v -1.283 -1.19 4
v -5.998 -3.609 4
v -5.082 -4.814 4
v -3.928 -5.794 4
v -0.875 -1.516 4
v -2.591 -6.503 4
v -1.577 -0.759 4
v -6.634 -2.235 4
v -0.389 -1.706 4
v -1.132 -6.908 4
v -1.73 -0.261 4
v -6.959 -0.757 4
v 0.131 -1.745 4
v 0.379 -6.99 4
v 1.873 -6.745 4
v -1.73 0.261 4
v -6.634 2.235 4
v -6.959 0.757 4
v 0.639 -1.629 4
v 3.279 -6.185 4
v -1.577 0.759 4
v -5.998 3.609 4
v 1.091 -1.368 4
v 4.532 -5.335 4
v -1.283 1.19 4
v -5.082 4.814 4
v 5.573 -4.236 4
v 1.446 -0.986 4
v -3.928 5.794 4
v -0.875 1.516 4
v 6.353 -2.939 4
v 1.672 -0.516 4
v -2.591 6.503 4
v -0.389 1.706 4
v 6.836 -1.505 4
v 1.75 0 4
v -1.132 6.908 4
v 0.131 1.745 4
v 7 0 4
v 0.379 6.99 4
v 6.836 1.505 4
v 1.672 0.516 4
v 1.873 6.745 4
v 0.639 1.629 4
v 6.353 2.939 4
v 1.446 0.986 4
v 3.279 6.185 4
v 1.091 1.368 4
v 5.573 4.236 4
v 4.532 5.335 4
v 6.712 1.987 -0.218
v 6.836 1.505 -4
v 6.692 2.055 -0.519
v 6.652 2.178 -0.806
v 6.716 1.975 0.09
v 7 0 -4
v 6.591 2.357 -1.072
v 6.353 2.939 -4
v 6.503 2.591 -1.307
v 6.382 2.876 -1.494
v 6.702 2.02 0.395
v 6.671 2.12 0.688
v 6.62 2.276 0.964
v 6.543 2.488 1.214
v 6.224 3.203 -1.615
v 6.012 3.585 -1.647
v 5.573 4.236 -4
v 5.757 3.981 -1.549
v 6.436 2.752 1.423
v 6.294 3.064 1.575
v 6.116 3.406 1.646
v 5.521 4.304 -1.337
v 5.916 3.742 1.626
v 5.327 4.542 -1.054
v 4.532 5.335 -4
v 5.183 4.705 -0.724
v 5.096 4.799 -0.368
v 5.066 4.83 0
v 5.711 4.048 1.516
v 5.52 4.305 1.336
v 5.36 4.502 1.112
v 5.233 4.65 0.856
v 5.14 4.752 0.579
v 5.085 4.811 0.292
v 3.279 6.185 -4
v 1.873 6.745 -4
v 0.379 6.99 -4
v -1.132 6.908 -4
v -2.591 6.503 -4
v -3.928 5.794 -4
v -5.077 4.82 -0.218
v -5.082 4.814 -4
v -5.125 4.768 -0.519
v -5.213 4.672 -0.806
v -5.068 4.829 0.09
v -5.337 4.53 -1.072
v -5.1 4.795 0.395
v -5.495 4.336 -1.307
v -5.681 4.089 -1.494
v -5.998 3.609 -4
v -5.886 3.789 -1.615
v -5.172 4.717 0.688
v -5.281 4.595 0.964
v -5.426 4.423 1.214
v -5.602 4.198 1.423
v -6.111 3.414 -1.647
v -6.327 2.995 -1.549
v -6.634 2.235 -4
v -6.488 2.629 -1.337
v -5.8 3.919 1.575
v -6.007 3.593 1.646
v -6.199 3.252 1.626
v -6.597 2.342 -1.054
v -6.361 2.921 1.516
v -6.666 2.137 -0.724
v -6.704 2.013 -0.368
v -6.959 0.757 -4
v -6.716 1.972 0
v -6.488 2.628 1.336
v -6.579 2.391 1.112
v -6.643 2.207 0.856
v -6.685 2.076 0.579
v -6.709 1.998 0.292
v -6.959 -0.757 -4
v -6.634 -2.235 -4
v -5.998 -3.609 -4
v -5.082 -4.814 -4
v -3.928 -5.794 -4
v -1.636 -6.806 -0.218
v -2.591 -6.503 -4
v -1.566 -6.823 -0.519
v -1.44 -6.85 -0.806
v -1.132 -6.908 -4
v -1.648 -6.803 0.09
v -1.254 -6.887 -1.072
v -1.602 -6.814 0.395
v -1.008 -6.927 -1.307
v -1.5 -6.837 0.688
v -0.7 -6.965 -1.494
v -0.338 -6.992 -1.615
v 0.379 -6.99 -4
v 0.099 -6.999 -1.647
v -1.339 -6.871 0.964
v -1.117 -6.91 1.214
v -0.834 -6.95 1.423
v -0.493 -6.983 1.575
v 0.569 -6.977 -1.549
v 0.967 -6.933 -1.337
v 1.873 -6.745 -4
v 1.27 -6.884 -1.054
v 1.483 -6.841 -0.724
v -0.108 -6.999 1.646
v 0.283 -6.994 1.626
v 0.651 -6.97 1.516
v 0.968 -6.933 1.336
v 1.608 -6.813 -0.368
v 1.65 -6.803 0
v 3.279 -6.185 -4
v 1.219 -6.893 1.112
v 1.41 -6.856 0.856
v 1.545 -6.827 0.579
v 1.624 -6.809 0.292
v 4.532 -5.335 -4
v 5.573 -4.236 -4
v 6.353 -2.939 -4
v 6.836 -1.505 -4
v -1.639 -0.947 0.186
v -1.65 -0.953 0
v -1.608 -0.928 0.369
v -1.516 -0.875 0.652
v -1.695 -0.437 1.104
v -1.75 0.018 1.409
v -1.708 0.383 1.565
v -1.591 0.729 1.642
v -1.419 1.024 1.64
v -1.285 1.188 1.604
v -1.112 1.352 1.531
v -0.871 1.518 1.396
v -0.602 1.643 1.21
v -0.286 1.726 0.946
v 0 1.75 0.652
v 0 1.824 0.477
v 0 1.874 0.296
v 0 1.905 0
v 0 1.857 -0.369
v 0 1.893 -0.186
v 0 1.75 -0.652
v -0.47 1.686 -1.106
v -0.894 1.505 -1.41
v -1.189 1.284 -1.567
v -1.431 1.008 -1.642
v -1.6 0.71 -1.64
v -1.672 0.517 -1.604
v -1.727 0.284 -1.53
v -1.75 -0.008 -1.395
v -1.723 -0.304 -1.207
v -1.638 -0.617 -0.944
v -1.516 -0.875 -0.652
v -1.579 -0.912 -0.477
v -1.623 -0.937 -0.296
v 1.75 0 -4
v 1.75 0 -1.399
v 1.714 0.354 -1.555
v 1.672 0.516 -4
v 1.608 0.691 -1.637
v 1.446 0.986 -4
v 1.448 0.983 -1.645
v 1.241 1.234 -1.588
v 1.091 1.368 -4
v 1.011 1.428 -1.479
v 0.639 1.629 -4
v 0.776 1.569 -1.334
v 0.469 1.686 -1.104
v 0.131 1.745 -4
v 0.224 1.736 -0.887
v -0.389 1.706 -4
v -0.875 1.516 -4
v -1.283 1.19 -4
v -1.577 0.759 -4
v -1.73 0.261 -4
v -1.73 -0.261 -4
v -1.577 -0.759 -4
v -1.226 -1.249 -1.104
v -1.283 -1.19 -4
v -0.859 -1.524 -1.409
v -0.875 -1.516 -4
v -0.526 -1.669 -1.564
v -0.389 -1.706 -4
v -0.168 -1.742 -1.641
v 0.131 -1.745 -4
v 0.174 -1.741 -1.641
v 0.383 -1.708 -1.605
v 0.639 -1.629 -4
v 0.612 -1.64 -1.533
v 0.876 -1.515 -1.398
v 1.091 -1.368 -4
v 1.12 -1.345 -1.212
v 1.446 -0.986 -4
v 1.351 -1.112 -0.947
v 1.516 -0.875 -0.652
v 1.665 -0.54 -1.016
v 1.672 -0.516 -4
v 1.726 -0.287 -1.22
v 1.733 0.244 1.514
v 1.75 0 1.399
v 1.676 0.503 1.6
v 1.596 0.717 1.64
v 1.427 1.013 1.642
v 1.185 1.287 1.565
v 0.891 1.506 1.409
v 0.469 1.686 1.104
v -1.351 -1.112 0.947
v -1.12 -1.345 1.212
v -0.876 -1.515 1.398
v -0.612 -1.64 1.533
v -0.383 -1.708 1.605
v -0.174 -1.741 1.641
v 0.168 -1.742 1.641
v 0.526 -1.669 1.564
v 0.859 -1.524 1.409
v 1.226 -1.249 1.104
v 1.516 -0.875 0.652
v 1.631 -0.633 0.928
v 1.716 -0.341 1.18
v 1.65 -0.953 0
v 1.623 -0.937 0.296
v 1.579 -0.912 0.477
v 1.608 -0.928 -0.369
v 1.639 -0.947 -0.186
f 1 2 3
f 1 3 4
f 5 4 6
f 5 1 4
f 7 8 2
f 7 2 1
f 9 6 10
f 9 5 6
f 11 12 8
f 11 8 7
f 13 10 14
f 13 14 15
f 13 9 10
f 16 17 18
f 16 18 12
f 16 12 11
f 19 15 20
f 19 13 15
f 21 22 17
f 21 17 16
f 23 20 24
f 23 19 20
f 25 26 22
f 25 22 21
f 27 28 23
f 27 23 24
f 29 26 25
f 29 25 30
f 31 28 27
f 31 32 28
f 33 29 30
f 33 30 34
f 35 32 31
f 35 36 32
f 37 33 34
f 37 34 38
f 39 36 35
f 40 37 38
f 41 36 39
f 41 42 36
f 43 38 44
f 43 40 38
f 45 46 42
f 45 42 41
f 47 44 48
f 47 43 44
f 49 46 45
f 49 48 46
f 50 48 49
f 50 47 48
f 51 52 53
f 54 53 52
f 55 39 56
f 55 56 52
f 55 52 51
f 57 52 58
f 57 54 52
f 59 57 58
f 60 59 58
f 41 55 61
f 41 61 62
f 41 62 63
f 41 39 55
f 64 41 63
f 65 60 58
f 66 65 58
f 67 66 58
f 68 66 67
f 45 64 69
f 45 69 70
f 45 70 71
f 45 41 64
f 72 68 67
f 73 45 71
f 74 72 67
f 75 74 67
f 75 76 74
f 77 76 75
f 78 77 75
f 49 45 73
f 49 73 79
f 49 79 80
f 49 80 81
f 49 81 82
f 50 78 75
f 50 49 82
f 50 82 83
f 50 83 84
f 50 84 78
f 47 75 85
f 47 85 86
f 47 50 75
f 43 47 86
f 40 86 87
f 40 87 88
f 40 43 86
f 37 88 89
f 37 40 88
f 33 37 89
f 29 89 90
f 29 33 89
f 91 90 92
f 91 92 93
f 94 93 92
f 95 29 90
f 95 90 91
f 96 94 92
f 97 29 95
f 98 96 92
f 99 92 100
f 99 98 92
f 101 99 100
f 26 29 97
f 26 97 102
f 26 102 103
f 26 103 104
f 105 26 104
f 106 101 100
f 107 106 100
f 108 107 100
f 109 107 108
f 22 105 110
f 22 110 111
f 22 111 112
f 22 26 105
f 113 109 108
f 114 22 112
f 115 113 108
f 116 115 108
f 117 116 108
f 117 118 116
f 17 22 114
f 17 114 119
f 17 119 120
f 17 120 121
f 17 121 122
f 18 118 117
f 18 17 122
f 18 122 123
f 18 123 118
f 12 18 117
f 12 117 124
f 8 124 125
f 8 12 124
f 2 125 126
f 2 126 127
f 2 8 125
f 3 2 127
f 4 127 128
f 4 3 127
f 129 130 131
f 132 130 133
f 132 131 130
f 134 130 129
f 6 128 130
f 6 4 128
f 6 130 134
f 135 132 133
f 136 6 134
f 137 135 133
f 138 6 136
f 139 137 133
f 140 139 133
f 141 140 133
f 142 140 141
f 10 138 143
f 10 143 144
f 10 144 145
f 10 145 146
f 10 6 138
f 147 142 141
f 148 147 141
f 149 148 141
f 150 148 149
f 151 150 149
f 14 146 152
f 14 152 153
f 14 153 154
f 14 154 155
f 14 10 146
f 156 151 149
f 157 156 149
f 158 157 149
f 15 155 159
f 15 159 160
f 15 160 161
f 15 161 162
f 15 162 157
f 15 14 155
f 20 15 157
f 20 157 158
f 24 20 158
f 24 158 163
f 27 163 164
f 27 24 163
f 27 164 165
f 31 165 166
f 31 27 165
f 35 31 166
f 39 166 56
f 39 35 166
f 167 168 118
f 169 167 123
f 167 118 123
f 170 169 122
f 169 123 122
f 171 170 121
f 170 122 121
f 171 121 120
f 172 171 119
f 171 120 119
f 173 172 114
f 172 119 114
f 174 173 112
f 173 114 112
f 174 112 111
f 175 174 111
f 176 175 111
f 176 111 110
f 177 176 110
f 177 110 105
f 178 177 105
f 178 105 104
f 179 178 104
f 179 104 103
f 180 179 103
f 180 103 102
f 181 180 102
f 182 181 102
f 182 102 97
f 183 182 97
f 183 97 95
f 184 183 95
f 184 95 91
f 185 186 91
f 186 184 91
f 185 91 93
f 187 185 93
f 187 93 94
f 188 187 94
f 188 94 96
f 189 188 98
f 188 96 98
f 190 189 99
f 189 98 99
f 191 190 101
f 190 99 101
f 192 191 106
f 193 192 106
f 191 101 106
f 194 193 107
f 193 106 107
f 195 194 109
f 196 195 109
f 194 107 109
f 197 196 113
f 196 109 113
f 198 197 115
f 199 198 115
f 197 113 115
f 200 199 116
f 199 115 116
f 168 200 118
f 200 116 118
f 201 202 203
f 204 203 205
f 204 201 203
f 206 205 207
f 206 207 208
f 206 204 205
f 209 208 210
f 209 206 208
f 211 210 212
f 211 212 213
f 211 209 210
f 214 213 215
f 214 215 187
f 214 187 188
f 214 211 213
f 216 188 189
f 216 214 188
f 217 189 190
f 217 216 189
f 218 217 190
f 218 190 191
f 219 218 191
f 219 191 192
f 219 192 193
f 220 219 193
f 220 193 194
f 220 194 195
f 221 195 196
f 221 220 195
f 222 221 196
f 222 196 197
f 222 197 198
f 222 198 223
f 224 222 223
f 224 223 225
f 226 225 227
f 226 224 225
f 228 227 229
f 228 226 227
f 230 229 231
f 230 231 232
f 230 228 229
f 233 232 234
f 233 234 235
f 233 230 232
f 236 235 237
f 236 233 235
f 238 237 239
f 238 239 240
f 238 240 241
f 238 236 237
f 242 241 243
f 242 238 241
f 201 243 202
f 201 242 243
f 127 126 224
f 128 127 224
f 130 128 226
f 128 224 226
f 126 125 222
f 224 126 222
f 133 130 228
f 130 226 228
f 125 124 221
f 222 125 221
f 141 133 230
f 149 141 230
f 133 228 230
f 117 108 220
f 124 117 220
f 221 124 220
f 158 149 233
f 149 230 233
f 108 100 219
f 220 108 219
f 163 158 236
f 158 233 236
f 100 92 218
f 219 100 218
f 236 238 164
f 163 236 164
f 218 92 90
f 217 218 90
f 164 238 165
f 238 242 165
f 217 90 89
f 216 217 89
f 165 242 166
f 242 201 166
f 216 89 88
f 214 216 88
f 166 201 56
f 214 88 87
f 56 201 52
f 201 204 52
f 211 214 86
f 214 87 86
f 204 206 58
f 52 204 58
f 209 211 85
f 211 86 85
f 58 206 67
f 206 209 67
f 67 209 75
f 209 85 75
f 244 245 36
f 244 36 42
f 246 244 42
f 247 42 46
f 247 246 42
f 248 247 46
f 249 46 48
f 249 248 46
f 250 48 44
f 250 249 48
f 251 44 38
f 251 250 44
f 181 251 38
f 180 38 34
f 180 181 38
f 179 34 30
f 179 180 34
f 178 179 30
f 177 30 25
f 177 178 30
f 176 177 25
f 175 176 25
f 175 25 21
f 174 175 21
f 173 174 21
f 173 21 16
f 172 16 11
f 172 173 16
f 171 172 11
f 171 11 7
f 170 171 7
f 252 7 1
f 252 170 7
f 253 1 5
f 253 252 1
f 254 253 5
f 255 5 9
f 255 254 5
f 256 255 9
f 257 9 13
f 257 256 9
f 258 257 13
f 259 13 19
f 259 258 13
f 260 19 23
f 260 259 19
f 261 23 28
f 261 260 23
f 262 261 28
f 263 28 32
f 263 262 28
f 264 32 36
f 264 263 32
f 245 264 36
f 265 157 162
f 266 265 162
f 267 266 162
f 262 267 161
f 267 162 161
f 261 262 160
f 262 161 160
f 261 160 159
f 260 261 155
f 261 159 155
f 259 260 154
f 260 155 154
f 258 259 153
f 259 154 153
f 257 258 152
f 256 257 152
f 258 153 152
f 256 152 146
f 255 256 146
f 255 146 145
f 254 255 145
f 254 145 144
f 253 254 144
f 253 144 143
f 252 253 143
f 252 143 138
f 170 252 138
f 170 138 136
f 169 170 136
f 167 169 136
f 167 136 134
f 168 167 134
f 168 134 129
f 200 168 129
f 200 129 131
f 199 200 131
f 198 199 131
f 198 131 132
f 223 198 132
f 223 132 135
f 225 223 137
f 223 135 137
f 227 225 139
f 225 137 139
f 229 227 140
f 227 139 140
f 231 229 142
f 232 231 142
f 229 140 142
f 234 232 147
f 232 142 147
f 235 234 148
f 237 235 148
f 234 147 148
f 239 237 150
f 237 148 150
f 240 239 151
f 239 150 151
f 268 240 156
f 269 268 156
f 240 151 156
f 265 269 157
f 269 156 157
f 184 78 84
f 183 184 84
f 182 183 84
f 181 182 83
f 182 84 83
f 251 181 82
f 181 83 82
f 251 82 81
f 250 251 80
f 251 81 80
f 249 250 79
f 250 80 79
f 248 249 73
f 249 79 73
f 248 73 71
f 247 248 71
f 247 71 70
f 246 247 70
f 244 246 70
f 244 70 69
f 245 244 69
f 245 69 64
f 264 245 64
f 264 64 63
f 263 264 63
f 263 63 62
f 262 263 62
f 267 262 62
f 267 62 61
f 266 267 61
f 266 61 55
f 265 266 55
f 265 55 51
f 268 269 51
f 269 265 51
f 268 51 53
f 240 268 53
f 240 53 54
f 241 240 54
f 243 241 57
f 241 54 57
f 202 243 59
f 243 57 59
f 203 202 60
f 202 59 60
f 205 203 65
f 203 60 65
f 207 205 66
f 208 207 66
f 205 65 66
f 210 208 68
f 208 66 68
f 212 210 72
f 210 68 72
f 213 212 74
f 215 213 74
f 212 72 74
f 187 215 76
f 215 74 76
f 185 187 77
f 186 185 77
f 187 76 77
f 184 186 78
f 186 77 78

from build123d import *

# Parameters (mm, degrees)
F0_R     = 7
F0_R_2   = 1.75
F1_DEPTH = 4
F2_R     = 1.65
F3_DEPTH = 7
F4_COUNT = 3
F5_DEPTH = 7
F6_DEPTH = 7
F7_DEPTH = 7


with BuildPart() as f1:
    # F0 (on Top) → F1 (new body, symmetric)
    with BuildSketch(Plane.XY):
        Circle(F0_R)
        Circle(F0_R_2, mode=Mode.SUBTRACT)
    extrude(amount=F1_DEPTH, both=True)


with BuildPart() as f3:
    # F2 (on Front) → F3 (new body)
    with BuildSketch(Plane.XZ):
        Circle(F2_R)
    extrude(amount=F3_DEPTH)


with BuildPart() as f4_1:
    # F4: instance of F3
    add(f3.part.rotate(Axis((0, 0, 4), (0, 0, 1)), 1 * 360 / F4_COUNT))


with BuildPart() as f4_2:
    # F4: instance of F3
    add(f3.part.rotate(Axis((0, 0, 4), (0, 0, 1)), 2 * 360 / F4_COUNT))


with BuildPart() as f5_tool:
    # F5 (cut): a face of the model
    f5_faces = [f3.part.faces().sort_by_distance(p)[0] for p in [
        (0, -7, 0),
    ]]
    extrude(f5_faces, amount=-F5_DEPTH)


with BuildPart() as f1_1:
    add(f1.part)

    # F5: cut by f5_tool
    add(f5_tool.part, mode=Mode.SUBTRACT)


with BuildPart() as f3_1:
    add(f3.part)

    # F5: cut by f5_tool
    add(f5_tool.part, mode=Mode.SUBTRACT)


with BuildPart() as f4_1_1:
    add(f4_1.part)

    # F5: cut by f5_tool
    add(f5_tool.part, mode=Mode.SUBTRACT)


with BuildPart() as f4_2_1:
    add(f4_2.part)

    # F5: cut by f5_tool
    add(f5_tool.part, mode=Mode.SUBTRACT)


with BuildPart() as f6_tool:
    # F6 (cut): a face of the model
    f6_faces = [f4_1_1.part.faces().sort_by_distance(p)[0] for p in [
        (6.0621778265, 3.5, 0),
    ]]
    extrude(f6_faces, amount=-F6_DEPTH)


with BuildPart() as f1_2:
    add(f1_1.part)

    # F6: cut by f6_tool
    add(f6_tool.part, mode=Mode.SUBTRACT)


with BuildPart() as f4_1_2:
    add(f4_1_1.part)

    # F6: cut by f6_tool
    add(f6_tool.part, mode=Mode.SUBTRACT)


with BuildPart() as f4_2_2:
    add(f4_2_1.part)

    # F6: cut by f6_tool
    add(f6_tool.part, mode=Mode.SUBTRACT)


with BuildPart() as f7_tool:
    # F7 (cut): a face of the model
    f7_faces = [f4_2_2.part.faces().sort_by_distance(p)[0] for p in [
        (-6.0621778265, 3.5, 0),
    ]]
    extrude(f7_faces, amount=-F7_DEPTH)


with BuildPart() as f1_3:
    add(f1_2.part)

    # F7: cut by f7_tool
    add(f7_tool.part, mode=Mode.SUBTRACT)


with BuildPart() as f4_2_3:
    add(f4_2_2.part)

    # F7: cut by f7_tool
    add(f7_tool.part, mode=Mode.SUBTRACT)


solid = f1_3.part
